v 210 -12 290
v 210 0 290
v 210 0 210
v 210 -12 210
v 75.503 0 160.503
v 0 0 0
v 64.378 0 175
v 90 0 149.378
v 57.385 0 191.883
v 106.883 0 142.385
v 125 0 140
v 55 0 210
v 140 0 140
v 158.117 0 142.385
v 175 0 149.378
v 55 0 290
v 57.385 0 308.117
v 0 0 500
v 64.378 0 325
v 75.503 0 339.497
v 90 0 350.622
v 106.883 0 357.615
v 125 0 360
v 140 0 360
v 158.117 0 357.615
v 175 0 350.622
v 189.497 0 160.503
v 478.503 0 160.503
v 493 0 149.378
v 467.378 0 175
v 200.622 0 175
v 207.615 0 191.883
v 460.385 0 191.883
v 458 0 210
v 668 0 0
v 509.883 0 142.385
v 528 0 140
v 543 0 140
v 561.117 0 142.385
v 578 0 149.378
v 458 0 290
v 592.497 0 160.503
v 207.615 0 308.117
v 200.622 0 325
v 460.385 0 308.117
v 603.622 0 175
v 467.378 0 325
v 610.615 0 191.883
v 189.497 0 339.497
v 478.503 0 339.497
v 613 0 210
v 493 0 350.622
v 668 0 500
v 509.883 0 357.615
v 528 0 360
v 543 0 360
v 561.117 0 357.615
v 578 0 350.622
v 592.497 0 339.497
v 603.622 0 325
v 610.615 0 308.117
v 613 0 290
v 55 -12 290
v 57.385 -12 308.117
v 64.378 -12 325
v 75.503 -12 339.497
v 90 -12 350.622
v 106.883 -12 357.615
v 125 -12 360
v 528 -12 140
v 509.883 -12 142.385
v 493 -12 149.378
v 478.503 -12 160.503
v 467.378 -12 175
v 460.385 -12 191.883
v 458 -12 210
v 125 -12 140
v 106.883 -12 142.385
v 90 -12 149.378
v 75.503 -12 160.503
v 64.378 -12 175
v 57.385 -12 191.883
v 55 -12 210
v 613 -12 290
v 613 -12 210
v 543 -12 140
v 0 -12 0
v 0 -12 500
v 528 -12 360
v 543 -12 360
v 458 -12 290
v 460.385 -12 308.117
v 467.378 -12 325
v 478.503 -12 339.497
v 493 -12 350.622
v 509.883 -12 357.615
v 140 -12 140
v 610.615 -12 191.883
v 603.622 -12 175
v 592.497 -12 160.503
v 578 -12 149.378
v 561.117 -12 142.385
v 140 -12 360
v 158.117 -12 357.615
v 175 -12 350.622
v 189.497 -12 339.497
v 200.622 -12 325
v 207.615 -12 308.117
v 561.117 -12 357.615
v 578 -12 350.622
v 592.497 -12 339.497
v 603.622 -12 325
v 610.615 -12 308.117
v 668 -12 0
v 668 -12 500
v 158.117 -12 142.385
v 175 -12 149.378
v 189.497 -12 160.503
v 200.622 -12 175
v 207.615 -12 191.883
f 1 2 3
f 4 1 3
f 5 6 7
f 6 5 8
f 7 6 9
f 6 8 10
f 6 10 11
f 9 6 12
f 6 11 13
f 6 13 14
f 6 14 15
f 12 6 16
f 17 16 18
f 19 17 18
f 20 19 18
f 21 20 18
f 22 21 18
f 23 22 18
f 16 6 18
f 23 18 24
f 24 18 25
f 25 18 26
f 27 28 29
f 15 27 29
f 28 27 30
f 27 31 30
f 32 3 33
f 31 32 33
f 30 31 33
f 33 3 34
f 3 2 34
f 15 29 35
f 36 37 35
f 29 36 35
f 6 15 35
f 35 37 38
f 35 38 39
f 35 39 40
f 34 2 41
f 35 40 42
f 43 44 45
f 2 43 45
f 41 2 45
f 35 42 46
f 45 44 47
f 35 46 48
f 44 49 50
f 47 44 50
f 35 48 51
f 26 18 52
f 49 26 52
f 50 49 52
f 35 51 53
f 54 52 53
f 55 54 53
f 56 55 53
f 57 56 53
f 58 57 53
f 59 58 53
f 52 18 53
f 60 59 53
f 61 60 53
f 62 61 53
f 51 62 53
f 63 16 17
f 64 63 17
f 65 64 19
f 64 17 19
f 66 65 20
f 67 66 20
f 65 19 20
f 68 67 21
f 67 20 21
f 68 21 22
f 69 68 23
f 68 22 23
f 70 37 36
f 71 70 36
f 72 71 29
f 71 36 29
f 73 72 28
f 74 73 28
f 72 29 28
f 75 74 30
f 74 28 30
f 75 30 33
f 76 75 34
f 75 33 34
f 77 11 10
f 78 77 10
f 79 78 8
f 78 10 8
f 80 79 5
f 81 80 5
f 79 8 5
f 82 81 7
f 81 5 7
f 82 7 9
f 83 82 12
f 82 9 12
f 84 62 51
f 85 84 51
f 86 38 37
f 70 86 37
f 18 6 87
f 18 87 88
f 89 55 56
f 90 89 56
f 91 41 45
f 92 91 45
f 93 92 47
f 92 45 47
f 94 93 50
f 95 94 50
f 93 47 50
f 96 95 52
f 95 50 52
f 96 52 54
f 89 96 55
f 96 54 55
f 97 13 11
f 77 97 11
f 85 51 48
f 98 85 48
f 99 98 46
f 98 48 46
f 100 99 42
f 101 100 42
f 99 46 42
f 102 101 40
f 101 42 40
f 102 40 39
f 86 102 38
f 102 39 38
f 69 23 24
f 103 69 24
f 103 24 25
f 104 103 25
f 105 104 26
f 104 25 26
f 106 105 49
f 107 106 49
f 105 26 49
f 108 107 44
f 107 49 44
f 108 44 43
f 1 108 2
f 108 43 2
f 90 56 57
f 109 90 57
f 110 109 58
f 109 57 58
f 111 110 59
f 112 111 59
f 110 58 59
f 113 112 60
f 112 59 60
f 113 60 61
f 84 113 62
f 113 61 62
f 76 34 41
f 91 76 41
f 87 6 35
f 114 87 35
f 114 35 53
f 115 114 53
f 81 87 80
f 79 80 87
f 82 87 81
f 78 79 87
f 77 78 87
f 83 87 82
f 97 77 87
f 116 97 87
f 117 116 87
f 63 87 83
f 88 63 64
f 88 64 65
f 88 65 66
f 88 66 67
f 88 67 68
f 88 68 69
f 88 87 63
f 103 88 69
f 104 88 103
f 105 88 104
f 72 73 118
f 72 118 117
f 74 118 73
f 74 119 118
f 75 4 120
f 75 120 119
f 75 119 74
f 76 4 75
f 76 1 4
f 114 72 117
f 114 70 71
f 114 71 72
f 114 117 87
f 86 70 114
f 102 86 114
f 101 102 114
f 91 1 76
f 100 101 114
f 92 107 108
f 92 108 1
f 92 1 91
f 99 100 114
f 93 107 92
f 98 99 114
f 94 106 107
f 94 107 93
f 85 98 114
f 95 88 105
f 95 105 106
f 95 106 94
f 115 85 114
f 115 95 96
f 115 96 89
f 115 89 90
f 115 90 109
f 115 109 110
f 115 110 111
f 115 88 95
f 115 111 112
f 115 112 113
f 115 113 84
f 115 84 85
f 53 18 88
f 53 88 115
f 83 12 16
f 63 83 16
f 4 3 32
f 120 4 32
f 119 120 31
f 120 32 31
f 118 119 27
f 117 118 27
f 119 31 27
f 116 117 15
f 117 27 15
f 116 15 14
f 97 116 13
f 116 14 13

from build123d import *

# Parameters (mm, degrees)
F0_W     = 668
F0_H     = 500
F1_DEPTH = 12


with BuildPart() as f1:
    # F0 (on Front) → F1 (new body)
    with BuildSketch(Plane.XZ):
        with Locations((334, 250)):
            Rectangle(F0_W, F0_H)
        with BuildLine():
            Line((140, 140), (125, 140))
            ThreePointArc((125, 140), (75.502525, 160.502525), (55, 210))
            Line((55, 210), (55, 290))
            ThreePointArc((55, 290), (75.502525, 339.497475), (125, 360))
            Line((125, 360), (140, 360))
            ThreePointArc((140, 360), (189.497475, 339.497475), (210, 290))
            Line((210, 290), (210, 210))
            ThreePointArc((210, 210), (189.497475, 160.502525), (140, 140))
        make_face(mode=Mode.SUBTRACT)
        with BuildLine():
            Line((543, 140), (528, 140))
            ThreePointArc((528, 140), (478.502525, 160.502525), (458, 210))
            Line((458, 210), (458, 290))
            ThreePointArc((458, 290), (478.502525, 339.497475), (528, 360))
            Line((528, 360), (543, 360))
            ThreePointArc((543, 360), (592.497475, 339.497475), (613, 290))
            Line((613, 290), (613, 210))
            ThreePointArc((613, 210), (592.497475, 160.502525), (543, 140))
        make_face(mode=Mode.SUBTRACT)
    extrude(amount=F1_DEPTH)


solid = f1.part
